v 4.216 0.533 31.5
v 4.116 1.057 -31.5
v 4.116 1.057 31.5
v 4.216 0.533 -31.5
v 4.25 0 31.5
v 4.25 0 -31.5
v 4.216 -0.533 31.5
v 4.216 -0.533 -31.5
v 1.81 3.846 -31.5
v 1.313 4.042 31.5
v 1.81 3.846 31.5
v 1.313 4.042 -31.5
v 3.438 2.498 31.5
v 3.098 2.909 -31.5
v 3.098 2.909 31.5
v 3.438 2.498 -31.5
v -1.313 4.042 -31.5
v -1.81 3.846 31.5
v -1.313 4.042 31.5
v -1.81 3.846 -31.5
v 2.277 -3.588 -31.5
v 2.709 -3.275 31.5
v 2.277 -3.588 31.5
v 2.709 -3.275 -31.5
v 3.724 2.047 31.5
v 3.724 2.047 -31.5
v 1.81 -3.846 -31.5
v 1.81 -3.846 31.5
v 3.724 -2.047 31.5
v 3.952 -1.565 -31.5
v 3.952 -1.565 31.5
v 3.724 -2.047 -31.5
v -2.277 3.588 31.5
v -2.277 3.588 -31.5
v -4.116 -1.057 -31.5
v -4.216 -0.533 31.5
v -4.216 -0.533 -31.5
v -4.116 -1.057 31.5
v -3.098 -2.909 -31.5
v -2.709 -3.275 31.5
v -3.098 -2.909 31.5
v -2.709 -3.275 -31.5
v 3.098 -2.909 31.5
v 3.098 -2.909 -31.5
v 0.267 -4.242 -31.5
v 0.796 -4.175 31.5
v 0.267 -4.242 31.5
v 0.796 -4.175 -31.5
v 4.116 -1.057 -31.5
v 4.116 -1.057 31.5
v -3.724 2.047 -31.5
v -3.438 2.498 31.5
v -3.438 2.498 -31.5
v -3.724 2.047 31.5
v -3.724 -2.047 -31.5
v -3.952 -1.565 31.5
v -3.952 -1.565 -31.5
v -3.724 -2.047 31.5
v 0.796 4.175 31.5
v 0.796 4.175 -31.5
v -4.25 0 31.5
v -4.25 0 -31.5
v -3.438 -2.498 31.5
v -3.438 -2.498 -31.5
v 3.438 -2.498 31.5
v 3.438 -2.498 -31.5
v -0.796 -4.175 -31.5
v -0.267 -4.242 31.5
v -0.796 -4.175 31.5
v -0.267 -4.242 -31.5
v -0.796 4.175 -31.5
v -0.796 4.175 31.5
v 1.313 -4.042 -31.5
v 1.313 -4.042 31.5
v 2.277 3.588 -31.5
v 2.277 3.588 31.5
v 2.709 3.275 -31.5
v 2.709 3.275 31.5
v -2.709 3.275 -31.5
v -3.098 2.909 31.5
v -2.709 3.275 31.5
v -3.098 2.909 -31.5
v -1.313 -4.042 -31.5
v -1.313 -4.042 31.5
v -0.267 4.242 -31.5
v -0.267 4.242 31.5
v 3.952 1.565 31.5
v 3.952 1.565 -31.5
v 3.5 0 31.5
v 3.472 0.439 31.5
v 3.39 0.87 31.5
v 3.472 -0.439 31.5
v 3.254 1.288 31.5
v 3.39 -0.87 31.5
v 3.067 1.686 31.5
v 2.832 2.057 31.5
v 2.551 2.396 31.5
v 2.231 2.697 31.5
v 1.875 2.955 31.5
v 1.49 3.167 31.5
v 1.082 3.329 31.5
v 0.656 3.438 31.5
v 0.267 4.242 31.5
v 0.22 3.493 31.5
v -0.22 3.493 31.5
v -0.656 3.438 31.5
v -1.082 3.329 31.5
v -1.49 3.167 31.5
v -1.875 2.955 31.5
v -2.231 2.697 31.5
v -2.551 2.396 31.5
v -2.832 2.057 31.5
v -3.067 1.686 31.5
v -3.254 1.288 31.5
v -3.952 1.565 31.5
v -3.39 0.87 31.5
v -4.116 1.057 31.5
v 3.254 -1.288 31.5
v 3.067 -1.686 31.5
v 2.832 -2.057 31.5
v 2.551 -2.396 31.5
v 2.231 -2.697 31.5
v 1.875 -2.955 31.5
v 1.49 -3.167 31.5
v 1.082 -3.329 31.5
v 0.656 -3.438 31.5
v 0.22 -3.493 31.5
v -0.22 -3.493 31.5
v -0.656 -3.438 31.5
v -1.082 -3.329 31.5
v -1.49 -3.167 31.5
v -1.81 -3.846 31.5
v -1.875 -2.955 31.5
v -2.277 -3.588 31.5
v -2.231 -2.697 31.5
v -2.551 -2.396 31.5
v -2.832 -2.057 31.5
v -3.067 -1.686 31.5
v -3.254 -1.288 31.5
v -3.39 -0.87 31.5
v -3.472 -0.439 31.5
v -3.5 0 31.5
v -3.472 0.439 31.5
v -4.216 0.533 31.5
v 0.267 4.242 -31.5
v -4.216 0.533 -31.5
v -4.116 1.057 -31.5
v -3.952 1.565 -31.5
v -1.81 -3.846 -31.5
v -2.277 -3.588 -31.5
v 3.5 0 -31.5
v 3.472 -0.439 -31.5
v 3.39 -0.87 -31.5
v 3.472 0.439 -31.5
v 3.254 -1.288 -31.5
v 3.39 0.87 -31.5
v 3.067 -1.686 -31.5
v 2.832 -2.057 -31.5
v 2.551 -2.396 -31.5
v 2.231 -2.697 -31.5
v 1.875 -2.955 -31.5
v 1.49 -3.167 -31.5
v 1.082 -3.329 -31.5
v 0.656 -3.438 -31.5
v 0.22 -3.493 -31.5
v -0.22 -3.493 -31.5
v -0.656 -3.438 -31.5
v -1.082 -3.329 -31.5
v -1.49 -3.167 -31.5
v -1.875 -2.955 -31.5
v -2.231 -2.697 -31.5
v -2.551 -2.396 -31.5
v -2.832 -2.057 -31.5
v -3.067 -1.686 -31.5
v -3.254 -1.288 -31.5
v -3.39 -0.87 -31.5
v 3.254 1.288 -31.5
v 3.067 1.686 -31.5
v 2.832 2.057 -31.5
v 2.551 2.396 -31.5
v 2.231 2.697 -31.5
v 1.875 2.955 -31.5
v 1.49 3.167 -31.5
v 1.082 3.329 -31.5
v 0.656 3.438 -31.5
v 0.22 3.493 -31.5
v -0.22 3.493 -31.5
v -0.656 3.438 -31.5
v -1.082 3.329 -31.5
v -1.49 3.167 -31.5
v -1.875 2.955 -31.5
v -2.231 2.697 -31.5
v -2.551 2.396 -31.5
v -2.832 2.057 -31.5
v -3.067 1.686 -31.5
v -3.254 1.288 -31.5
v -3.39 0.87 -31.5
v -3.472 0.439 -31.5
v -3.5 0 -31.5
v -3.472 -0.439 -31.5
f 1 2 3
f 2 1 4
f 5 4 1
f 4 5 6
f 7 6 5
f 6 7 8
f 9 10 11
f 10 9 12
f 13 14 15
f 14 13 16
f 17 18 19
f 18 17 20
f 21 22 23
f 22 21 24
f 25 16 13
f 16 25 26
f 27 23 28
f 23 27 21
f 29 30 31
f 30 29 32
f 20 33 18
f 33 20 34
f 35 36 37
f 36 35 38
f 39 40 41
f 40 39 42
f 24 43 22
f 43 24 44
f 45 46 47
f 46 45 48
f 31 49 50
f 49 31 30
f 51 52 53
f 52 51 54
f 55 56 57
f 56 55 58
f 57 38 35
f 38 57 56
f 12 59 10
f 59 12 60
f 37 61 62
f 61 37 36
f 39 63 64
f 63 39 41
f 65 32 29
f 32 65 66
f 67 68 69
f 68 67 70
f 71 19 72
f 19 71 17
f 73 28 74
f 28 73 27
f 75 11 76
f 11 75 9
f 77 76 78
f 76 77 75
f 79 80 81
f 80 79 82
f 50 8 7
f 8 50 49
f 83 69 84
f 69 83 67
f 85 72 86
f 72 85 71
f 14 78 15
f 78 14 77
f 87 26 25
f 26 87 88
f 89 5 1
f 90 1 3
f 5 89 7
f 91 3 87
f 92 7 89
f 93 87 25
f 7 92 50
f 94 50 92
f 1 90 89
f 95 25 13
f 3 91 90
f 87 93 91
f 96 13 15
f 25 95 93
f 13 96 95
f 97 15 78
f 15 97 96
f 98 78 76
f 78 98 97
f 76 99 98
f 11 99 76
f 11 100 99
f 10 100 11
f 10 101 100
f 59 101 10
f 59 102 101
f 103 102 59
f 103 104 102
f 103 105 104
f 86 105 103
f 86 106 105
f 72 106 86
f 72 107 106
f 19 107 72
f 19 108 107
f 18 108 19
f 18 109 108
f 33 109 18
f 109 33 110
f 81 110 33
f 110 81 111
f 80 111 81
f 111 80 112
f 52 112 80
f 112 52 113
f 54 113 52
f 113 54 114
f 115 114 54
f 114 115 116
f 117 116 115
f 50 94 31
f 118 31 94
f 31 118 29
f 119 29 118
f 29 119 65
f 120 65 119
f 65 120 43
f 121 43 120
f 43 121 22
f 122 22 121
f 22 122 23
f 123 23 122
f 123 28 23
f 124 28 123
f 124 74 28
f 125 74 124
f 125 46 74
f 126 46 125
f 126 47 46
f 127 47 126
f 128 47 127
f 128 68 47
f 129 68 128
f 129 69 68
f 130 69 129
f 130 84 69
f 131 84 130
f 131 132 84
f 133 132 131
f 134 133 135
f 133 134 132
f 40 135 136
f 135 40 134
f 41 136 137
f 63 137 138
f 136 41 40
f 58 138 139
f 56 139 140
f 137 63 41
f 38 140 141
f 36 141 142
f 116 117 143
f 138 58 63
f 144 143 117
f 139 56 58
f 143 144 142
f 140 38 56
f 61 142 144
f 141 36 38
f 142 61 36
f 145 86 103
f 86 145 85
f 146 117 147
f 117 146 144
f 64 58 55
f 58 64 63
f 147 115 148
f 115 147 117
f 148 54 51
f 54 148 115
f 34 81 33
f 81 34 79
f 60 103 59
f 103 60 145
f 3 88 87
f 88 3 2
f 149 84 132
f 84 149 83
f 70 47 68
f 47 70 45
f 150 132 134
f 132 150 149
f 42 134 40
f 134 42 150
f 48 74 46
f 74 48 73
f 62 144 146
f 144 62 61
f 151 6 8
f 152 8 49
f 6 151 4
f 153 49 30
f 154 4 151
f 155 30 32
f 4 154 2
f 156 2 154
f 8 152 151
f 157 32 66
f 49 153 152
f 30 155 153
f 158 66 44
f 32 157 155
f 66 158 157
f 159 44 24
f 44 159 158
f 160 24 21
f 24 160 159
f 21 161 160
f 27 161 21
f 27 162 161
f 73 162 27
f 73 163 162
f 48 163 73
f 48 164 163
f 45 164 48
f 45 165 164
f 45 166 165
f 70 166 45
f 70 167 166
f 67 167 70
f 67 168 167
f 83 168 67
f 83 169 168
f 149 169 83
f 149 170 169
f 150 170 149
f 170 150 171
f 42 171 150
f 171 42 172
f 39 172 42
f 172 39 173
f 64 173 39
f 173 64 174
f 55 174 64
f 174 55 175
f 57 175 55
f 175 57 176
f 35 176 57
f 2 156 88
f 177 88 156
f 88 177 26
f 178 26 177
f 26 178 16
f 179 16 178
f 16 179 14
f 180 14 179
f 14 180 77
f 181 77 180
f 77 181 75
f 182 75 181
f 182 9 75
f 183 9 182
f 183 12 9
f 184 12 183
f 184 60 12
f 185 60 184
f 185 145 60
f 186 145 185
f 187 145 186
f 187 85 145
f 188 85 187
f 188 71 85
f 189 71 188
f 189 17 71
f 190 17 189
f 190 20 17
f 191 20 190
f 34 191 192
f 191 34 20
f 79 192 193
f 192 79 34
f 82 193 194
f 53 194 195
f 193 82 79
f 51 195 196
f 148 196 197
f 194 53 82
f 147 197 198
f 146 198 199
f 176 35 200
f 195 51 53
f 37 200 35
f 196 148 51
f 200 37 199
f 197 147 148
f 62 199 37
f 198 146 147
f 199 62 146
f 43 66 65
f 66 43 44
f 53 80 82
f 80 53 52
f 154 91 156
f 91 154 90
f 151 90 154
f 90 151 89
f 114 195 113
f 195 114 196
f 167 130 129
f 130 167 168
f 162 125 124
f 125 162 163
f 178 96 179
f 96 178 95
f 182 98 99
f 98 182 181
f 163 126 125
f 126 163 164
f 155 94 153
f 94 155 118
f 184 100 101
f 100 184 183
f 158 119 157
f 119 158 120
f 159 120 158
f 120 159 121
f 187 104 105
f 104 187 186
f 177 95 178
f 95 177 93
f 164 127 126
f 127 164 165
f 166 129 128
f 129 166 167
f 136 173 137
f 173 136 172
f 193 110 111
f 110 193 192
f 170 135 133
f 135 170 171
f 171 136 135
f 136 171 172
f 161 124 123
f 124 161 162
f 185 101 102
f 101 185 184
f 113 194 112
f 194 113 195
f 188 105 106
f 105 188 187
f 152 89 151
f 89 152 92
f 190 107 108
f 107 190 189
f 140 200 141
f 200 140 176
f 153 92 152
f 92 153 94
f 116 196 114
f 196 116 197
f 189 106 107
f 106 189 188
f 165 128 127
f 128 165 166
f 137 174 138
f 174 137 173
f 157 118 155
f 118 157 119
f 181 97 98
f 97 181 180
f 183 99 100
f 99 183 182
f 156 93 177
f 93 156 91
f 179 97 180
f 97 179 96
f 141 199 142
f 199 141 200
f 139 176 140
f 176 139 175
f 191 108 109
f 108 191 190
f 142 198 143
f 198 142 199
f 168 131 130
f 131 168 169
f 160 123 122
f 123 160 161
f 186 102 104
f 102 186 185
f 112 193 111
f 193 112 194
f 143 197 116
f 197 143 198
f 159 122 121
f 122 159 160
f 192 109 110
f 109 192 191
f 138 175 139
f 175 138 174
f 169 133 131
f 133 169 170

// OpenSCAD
$fn = 50;


difference() {
	union() {
		translate(v = [0, 0, -31.5000000000]) {
			cylinder(h = 63, r = 4.2500000000);
		}
	}
	union() {
		translate(v = [0, 0, -100.0000000000]) {
			cylinder(h = 200, r = 3.5000000000);
		}
	}
}
